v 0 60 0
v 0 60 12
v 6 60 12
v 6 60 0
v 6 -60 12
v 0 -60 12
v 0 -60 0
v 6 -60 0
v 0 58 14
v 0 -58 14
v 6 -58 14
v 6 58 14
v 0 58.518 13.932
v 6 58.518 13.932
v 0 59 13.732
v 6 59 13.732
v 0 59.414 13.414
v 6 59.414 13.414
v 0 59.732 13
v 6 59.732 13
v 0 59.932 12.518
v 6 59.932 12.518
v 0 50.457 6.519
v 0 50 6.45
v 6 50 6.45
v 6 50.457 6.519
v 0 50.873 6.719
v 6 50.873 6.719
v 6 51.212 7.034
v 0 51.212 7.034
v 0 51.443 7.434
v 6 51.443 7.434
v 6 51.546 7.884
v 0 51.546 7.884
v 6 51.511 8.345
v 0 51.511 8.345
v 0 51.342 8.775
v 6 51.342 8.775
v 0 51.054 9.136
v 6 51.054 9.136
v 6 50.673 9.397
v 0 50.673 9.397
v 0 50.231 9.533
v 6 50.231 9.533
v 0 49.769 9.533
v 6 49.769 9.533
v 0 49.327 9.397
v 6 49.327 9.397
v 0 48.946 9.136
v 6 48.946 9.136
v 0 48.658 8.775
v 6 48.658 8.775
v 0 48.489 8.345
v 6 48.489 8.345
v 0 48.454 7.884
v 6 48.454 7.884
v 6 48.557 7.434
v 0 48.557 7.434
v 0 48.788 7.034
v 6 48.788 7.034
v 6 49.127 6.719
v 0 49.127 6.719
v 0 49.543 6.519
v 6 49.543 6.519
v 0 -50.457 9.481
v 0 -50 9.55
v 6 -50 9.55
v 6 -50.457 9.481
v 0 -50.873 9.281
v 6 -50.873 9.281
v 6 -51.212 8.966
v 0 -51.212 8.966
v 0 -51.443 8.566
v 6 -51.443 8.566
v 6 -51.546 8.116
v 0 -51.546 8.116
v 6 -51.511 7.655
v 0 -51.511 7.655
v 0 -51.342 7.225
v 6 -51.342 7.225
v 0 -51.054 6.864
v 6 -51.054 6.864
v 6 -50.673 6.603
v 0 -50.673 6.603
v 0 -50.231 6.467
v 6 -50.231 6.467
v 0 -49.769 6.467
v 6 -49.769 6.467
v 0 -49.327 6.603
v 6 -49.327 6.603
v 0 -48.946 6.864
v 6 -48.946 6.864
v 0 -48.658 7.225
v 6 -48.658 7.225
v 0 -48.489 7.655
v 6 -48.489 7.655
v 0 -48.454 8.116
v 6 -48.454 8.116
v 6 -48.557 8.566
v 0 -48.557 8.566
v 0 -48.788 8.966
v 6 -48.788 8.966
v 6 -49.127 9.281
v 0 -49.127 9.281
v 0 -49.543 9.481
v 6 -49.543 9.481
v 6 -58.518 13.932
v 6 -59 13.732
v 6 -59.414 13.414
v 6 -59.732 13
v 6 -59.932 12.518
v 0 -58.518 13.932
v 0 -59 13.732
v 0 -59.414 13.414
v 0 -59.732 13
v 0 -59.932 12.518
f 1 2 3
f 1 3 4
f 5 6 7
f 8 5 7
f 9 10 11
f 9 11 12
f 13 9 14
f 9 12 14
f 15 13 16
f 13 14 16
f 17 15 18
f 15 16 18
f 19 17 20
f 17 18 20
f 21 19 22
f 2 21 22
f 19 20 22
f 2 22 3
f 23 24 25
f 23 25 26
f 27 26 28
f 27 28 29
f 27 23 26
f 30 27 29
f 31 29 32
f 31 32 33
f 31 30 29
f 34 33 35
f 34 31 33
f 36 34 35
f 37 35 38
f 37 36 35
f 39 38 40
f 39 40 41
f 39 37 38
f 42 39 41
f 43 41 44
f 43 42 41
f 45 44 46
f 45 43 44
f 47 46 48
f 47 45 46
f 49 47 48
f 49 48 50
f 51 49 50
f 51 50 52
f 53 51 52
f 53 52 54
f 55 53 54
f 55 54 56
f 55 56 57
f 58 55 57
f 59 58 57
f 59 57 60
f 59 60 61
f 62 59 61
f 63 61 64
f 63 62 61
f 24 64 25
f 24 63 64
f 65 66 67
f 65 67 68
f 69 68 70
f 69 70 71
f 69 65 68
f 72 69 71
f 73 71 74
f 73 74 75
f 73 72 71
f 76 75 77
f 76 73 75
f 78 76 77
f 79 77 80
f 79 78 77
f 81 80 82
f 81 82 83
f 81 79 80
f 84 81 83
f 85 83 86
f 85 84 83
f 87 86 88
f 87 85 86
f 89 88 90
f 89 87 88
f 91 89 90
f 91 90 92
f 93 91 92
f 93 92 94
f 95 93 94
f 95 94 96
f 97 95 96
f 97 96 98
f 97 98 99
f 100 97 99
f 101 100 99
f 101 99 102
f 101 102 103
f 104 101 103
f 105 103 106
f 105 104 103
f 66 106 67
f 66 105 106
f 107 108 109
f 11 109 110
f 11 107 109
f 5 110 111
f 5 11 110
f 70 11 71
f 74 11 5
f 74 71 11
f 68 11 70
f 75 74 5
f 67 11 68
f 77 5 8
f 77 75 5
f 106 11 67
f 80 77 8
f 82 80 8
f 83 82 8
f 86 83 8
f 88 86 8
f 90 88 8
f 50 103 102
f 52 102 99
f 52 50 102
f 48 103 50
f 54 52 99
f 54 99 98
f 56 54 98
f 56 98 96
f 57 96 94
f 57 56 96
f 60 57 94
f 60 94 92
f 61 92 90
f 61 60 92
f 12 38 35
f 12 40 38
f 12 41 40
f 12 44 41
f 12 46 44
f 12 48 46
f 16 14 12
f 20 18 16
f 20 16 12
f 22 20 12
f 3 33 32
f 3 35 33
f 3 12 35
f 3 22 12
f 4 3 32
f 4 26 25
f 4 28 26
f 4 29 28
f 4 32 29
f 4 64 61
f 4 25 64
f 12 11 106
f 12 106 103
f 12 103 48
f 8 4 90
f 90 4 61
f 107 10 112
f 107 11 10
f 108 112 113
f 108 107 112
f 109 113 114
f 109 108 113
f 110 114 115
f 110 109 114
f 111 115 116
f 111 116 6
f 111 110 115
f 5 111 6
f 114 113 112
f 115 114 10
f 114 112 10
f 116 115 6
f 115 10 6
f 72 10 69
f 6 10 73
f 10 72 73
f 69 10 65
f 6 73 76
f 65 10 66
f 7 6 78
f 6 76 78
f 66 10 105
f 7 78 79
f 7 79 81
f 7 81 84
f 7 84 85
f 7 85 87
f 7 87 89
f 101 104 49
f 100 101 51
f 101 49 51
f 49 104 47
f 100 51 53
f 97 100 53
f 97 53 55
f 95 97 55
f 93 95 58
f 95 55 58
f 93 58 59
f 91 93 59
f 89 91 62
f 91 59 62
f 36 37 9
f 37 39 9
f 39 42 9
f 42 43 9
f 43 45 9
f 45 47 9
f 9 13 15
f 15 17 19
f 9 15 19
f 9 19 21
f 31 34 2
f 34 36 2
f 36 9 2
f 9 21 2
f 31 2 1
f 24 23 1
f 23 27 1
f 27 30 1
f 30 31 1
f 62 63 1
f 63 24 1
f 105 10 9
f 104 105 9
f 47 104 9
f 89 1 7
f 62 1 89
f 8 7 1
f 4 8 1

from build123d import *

# Parameters (mm, degrees)
SKETCH1_W           = 14
SKETCH1_H           = 120
SKETCH1_R           = 1.55
BOSS_EXTRUDE1_DEPTH = 6
FILLET1_R           = 2


with BuildPart() as part:
    # Sketch1 → Boss-Extrude1 (new body)
    with BuildSketch(Plane(origin=(0, 0, 0), x_dir=(0, 0, -1), z_dir=(1, 0, 0))):
        with Locations((-7, 0)):
            Rectangle(SKETCH1_W, SKETCH1_H)
        with Locations((-8, 50)):
            Circle(SKETCH1_R, mode=Mode.SUBTRACT)
        with Locations(Location((-8, -50, 0), (0, 0, 180))):
            Circle(SKETCH1_R, mode=Mode.SUBTRACT)
    extrude(amount=BOSS_EXTRUDE1_DEPTH)

    # Fillet1
    fillet1_edges = [part.edges().sort_by_distance(p)[0] for p in [
        (3, -60, 14),
        (3, 60, 14),
    ]]
    fillet(fillet1_edges, radius=FILLET1_R)


solid = part.part
